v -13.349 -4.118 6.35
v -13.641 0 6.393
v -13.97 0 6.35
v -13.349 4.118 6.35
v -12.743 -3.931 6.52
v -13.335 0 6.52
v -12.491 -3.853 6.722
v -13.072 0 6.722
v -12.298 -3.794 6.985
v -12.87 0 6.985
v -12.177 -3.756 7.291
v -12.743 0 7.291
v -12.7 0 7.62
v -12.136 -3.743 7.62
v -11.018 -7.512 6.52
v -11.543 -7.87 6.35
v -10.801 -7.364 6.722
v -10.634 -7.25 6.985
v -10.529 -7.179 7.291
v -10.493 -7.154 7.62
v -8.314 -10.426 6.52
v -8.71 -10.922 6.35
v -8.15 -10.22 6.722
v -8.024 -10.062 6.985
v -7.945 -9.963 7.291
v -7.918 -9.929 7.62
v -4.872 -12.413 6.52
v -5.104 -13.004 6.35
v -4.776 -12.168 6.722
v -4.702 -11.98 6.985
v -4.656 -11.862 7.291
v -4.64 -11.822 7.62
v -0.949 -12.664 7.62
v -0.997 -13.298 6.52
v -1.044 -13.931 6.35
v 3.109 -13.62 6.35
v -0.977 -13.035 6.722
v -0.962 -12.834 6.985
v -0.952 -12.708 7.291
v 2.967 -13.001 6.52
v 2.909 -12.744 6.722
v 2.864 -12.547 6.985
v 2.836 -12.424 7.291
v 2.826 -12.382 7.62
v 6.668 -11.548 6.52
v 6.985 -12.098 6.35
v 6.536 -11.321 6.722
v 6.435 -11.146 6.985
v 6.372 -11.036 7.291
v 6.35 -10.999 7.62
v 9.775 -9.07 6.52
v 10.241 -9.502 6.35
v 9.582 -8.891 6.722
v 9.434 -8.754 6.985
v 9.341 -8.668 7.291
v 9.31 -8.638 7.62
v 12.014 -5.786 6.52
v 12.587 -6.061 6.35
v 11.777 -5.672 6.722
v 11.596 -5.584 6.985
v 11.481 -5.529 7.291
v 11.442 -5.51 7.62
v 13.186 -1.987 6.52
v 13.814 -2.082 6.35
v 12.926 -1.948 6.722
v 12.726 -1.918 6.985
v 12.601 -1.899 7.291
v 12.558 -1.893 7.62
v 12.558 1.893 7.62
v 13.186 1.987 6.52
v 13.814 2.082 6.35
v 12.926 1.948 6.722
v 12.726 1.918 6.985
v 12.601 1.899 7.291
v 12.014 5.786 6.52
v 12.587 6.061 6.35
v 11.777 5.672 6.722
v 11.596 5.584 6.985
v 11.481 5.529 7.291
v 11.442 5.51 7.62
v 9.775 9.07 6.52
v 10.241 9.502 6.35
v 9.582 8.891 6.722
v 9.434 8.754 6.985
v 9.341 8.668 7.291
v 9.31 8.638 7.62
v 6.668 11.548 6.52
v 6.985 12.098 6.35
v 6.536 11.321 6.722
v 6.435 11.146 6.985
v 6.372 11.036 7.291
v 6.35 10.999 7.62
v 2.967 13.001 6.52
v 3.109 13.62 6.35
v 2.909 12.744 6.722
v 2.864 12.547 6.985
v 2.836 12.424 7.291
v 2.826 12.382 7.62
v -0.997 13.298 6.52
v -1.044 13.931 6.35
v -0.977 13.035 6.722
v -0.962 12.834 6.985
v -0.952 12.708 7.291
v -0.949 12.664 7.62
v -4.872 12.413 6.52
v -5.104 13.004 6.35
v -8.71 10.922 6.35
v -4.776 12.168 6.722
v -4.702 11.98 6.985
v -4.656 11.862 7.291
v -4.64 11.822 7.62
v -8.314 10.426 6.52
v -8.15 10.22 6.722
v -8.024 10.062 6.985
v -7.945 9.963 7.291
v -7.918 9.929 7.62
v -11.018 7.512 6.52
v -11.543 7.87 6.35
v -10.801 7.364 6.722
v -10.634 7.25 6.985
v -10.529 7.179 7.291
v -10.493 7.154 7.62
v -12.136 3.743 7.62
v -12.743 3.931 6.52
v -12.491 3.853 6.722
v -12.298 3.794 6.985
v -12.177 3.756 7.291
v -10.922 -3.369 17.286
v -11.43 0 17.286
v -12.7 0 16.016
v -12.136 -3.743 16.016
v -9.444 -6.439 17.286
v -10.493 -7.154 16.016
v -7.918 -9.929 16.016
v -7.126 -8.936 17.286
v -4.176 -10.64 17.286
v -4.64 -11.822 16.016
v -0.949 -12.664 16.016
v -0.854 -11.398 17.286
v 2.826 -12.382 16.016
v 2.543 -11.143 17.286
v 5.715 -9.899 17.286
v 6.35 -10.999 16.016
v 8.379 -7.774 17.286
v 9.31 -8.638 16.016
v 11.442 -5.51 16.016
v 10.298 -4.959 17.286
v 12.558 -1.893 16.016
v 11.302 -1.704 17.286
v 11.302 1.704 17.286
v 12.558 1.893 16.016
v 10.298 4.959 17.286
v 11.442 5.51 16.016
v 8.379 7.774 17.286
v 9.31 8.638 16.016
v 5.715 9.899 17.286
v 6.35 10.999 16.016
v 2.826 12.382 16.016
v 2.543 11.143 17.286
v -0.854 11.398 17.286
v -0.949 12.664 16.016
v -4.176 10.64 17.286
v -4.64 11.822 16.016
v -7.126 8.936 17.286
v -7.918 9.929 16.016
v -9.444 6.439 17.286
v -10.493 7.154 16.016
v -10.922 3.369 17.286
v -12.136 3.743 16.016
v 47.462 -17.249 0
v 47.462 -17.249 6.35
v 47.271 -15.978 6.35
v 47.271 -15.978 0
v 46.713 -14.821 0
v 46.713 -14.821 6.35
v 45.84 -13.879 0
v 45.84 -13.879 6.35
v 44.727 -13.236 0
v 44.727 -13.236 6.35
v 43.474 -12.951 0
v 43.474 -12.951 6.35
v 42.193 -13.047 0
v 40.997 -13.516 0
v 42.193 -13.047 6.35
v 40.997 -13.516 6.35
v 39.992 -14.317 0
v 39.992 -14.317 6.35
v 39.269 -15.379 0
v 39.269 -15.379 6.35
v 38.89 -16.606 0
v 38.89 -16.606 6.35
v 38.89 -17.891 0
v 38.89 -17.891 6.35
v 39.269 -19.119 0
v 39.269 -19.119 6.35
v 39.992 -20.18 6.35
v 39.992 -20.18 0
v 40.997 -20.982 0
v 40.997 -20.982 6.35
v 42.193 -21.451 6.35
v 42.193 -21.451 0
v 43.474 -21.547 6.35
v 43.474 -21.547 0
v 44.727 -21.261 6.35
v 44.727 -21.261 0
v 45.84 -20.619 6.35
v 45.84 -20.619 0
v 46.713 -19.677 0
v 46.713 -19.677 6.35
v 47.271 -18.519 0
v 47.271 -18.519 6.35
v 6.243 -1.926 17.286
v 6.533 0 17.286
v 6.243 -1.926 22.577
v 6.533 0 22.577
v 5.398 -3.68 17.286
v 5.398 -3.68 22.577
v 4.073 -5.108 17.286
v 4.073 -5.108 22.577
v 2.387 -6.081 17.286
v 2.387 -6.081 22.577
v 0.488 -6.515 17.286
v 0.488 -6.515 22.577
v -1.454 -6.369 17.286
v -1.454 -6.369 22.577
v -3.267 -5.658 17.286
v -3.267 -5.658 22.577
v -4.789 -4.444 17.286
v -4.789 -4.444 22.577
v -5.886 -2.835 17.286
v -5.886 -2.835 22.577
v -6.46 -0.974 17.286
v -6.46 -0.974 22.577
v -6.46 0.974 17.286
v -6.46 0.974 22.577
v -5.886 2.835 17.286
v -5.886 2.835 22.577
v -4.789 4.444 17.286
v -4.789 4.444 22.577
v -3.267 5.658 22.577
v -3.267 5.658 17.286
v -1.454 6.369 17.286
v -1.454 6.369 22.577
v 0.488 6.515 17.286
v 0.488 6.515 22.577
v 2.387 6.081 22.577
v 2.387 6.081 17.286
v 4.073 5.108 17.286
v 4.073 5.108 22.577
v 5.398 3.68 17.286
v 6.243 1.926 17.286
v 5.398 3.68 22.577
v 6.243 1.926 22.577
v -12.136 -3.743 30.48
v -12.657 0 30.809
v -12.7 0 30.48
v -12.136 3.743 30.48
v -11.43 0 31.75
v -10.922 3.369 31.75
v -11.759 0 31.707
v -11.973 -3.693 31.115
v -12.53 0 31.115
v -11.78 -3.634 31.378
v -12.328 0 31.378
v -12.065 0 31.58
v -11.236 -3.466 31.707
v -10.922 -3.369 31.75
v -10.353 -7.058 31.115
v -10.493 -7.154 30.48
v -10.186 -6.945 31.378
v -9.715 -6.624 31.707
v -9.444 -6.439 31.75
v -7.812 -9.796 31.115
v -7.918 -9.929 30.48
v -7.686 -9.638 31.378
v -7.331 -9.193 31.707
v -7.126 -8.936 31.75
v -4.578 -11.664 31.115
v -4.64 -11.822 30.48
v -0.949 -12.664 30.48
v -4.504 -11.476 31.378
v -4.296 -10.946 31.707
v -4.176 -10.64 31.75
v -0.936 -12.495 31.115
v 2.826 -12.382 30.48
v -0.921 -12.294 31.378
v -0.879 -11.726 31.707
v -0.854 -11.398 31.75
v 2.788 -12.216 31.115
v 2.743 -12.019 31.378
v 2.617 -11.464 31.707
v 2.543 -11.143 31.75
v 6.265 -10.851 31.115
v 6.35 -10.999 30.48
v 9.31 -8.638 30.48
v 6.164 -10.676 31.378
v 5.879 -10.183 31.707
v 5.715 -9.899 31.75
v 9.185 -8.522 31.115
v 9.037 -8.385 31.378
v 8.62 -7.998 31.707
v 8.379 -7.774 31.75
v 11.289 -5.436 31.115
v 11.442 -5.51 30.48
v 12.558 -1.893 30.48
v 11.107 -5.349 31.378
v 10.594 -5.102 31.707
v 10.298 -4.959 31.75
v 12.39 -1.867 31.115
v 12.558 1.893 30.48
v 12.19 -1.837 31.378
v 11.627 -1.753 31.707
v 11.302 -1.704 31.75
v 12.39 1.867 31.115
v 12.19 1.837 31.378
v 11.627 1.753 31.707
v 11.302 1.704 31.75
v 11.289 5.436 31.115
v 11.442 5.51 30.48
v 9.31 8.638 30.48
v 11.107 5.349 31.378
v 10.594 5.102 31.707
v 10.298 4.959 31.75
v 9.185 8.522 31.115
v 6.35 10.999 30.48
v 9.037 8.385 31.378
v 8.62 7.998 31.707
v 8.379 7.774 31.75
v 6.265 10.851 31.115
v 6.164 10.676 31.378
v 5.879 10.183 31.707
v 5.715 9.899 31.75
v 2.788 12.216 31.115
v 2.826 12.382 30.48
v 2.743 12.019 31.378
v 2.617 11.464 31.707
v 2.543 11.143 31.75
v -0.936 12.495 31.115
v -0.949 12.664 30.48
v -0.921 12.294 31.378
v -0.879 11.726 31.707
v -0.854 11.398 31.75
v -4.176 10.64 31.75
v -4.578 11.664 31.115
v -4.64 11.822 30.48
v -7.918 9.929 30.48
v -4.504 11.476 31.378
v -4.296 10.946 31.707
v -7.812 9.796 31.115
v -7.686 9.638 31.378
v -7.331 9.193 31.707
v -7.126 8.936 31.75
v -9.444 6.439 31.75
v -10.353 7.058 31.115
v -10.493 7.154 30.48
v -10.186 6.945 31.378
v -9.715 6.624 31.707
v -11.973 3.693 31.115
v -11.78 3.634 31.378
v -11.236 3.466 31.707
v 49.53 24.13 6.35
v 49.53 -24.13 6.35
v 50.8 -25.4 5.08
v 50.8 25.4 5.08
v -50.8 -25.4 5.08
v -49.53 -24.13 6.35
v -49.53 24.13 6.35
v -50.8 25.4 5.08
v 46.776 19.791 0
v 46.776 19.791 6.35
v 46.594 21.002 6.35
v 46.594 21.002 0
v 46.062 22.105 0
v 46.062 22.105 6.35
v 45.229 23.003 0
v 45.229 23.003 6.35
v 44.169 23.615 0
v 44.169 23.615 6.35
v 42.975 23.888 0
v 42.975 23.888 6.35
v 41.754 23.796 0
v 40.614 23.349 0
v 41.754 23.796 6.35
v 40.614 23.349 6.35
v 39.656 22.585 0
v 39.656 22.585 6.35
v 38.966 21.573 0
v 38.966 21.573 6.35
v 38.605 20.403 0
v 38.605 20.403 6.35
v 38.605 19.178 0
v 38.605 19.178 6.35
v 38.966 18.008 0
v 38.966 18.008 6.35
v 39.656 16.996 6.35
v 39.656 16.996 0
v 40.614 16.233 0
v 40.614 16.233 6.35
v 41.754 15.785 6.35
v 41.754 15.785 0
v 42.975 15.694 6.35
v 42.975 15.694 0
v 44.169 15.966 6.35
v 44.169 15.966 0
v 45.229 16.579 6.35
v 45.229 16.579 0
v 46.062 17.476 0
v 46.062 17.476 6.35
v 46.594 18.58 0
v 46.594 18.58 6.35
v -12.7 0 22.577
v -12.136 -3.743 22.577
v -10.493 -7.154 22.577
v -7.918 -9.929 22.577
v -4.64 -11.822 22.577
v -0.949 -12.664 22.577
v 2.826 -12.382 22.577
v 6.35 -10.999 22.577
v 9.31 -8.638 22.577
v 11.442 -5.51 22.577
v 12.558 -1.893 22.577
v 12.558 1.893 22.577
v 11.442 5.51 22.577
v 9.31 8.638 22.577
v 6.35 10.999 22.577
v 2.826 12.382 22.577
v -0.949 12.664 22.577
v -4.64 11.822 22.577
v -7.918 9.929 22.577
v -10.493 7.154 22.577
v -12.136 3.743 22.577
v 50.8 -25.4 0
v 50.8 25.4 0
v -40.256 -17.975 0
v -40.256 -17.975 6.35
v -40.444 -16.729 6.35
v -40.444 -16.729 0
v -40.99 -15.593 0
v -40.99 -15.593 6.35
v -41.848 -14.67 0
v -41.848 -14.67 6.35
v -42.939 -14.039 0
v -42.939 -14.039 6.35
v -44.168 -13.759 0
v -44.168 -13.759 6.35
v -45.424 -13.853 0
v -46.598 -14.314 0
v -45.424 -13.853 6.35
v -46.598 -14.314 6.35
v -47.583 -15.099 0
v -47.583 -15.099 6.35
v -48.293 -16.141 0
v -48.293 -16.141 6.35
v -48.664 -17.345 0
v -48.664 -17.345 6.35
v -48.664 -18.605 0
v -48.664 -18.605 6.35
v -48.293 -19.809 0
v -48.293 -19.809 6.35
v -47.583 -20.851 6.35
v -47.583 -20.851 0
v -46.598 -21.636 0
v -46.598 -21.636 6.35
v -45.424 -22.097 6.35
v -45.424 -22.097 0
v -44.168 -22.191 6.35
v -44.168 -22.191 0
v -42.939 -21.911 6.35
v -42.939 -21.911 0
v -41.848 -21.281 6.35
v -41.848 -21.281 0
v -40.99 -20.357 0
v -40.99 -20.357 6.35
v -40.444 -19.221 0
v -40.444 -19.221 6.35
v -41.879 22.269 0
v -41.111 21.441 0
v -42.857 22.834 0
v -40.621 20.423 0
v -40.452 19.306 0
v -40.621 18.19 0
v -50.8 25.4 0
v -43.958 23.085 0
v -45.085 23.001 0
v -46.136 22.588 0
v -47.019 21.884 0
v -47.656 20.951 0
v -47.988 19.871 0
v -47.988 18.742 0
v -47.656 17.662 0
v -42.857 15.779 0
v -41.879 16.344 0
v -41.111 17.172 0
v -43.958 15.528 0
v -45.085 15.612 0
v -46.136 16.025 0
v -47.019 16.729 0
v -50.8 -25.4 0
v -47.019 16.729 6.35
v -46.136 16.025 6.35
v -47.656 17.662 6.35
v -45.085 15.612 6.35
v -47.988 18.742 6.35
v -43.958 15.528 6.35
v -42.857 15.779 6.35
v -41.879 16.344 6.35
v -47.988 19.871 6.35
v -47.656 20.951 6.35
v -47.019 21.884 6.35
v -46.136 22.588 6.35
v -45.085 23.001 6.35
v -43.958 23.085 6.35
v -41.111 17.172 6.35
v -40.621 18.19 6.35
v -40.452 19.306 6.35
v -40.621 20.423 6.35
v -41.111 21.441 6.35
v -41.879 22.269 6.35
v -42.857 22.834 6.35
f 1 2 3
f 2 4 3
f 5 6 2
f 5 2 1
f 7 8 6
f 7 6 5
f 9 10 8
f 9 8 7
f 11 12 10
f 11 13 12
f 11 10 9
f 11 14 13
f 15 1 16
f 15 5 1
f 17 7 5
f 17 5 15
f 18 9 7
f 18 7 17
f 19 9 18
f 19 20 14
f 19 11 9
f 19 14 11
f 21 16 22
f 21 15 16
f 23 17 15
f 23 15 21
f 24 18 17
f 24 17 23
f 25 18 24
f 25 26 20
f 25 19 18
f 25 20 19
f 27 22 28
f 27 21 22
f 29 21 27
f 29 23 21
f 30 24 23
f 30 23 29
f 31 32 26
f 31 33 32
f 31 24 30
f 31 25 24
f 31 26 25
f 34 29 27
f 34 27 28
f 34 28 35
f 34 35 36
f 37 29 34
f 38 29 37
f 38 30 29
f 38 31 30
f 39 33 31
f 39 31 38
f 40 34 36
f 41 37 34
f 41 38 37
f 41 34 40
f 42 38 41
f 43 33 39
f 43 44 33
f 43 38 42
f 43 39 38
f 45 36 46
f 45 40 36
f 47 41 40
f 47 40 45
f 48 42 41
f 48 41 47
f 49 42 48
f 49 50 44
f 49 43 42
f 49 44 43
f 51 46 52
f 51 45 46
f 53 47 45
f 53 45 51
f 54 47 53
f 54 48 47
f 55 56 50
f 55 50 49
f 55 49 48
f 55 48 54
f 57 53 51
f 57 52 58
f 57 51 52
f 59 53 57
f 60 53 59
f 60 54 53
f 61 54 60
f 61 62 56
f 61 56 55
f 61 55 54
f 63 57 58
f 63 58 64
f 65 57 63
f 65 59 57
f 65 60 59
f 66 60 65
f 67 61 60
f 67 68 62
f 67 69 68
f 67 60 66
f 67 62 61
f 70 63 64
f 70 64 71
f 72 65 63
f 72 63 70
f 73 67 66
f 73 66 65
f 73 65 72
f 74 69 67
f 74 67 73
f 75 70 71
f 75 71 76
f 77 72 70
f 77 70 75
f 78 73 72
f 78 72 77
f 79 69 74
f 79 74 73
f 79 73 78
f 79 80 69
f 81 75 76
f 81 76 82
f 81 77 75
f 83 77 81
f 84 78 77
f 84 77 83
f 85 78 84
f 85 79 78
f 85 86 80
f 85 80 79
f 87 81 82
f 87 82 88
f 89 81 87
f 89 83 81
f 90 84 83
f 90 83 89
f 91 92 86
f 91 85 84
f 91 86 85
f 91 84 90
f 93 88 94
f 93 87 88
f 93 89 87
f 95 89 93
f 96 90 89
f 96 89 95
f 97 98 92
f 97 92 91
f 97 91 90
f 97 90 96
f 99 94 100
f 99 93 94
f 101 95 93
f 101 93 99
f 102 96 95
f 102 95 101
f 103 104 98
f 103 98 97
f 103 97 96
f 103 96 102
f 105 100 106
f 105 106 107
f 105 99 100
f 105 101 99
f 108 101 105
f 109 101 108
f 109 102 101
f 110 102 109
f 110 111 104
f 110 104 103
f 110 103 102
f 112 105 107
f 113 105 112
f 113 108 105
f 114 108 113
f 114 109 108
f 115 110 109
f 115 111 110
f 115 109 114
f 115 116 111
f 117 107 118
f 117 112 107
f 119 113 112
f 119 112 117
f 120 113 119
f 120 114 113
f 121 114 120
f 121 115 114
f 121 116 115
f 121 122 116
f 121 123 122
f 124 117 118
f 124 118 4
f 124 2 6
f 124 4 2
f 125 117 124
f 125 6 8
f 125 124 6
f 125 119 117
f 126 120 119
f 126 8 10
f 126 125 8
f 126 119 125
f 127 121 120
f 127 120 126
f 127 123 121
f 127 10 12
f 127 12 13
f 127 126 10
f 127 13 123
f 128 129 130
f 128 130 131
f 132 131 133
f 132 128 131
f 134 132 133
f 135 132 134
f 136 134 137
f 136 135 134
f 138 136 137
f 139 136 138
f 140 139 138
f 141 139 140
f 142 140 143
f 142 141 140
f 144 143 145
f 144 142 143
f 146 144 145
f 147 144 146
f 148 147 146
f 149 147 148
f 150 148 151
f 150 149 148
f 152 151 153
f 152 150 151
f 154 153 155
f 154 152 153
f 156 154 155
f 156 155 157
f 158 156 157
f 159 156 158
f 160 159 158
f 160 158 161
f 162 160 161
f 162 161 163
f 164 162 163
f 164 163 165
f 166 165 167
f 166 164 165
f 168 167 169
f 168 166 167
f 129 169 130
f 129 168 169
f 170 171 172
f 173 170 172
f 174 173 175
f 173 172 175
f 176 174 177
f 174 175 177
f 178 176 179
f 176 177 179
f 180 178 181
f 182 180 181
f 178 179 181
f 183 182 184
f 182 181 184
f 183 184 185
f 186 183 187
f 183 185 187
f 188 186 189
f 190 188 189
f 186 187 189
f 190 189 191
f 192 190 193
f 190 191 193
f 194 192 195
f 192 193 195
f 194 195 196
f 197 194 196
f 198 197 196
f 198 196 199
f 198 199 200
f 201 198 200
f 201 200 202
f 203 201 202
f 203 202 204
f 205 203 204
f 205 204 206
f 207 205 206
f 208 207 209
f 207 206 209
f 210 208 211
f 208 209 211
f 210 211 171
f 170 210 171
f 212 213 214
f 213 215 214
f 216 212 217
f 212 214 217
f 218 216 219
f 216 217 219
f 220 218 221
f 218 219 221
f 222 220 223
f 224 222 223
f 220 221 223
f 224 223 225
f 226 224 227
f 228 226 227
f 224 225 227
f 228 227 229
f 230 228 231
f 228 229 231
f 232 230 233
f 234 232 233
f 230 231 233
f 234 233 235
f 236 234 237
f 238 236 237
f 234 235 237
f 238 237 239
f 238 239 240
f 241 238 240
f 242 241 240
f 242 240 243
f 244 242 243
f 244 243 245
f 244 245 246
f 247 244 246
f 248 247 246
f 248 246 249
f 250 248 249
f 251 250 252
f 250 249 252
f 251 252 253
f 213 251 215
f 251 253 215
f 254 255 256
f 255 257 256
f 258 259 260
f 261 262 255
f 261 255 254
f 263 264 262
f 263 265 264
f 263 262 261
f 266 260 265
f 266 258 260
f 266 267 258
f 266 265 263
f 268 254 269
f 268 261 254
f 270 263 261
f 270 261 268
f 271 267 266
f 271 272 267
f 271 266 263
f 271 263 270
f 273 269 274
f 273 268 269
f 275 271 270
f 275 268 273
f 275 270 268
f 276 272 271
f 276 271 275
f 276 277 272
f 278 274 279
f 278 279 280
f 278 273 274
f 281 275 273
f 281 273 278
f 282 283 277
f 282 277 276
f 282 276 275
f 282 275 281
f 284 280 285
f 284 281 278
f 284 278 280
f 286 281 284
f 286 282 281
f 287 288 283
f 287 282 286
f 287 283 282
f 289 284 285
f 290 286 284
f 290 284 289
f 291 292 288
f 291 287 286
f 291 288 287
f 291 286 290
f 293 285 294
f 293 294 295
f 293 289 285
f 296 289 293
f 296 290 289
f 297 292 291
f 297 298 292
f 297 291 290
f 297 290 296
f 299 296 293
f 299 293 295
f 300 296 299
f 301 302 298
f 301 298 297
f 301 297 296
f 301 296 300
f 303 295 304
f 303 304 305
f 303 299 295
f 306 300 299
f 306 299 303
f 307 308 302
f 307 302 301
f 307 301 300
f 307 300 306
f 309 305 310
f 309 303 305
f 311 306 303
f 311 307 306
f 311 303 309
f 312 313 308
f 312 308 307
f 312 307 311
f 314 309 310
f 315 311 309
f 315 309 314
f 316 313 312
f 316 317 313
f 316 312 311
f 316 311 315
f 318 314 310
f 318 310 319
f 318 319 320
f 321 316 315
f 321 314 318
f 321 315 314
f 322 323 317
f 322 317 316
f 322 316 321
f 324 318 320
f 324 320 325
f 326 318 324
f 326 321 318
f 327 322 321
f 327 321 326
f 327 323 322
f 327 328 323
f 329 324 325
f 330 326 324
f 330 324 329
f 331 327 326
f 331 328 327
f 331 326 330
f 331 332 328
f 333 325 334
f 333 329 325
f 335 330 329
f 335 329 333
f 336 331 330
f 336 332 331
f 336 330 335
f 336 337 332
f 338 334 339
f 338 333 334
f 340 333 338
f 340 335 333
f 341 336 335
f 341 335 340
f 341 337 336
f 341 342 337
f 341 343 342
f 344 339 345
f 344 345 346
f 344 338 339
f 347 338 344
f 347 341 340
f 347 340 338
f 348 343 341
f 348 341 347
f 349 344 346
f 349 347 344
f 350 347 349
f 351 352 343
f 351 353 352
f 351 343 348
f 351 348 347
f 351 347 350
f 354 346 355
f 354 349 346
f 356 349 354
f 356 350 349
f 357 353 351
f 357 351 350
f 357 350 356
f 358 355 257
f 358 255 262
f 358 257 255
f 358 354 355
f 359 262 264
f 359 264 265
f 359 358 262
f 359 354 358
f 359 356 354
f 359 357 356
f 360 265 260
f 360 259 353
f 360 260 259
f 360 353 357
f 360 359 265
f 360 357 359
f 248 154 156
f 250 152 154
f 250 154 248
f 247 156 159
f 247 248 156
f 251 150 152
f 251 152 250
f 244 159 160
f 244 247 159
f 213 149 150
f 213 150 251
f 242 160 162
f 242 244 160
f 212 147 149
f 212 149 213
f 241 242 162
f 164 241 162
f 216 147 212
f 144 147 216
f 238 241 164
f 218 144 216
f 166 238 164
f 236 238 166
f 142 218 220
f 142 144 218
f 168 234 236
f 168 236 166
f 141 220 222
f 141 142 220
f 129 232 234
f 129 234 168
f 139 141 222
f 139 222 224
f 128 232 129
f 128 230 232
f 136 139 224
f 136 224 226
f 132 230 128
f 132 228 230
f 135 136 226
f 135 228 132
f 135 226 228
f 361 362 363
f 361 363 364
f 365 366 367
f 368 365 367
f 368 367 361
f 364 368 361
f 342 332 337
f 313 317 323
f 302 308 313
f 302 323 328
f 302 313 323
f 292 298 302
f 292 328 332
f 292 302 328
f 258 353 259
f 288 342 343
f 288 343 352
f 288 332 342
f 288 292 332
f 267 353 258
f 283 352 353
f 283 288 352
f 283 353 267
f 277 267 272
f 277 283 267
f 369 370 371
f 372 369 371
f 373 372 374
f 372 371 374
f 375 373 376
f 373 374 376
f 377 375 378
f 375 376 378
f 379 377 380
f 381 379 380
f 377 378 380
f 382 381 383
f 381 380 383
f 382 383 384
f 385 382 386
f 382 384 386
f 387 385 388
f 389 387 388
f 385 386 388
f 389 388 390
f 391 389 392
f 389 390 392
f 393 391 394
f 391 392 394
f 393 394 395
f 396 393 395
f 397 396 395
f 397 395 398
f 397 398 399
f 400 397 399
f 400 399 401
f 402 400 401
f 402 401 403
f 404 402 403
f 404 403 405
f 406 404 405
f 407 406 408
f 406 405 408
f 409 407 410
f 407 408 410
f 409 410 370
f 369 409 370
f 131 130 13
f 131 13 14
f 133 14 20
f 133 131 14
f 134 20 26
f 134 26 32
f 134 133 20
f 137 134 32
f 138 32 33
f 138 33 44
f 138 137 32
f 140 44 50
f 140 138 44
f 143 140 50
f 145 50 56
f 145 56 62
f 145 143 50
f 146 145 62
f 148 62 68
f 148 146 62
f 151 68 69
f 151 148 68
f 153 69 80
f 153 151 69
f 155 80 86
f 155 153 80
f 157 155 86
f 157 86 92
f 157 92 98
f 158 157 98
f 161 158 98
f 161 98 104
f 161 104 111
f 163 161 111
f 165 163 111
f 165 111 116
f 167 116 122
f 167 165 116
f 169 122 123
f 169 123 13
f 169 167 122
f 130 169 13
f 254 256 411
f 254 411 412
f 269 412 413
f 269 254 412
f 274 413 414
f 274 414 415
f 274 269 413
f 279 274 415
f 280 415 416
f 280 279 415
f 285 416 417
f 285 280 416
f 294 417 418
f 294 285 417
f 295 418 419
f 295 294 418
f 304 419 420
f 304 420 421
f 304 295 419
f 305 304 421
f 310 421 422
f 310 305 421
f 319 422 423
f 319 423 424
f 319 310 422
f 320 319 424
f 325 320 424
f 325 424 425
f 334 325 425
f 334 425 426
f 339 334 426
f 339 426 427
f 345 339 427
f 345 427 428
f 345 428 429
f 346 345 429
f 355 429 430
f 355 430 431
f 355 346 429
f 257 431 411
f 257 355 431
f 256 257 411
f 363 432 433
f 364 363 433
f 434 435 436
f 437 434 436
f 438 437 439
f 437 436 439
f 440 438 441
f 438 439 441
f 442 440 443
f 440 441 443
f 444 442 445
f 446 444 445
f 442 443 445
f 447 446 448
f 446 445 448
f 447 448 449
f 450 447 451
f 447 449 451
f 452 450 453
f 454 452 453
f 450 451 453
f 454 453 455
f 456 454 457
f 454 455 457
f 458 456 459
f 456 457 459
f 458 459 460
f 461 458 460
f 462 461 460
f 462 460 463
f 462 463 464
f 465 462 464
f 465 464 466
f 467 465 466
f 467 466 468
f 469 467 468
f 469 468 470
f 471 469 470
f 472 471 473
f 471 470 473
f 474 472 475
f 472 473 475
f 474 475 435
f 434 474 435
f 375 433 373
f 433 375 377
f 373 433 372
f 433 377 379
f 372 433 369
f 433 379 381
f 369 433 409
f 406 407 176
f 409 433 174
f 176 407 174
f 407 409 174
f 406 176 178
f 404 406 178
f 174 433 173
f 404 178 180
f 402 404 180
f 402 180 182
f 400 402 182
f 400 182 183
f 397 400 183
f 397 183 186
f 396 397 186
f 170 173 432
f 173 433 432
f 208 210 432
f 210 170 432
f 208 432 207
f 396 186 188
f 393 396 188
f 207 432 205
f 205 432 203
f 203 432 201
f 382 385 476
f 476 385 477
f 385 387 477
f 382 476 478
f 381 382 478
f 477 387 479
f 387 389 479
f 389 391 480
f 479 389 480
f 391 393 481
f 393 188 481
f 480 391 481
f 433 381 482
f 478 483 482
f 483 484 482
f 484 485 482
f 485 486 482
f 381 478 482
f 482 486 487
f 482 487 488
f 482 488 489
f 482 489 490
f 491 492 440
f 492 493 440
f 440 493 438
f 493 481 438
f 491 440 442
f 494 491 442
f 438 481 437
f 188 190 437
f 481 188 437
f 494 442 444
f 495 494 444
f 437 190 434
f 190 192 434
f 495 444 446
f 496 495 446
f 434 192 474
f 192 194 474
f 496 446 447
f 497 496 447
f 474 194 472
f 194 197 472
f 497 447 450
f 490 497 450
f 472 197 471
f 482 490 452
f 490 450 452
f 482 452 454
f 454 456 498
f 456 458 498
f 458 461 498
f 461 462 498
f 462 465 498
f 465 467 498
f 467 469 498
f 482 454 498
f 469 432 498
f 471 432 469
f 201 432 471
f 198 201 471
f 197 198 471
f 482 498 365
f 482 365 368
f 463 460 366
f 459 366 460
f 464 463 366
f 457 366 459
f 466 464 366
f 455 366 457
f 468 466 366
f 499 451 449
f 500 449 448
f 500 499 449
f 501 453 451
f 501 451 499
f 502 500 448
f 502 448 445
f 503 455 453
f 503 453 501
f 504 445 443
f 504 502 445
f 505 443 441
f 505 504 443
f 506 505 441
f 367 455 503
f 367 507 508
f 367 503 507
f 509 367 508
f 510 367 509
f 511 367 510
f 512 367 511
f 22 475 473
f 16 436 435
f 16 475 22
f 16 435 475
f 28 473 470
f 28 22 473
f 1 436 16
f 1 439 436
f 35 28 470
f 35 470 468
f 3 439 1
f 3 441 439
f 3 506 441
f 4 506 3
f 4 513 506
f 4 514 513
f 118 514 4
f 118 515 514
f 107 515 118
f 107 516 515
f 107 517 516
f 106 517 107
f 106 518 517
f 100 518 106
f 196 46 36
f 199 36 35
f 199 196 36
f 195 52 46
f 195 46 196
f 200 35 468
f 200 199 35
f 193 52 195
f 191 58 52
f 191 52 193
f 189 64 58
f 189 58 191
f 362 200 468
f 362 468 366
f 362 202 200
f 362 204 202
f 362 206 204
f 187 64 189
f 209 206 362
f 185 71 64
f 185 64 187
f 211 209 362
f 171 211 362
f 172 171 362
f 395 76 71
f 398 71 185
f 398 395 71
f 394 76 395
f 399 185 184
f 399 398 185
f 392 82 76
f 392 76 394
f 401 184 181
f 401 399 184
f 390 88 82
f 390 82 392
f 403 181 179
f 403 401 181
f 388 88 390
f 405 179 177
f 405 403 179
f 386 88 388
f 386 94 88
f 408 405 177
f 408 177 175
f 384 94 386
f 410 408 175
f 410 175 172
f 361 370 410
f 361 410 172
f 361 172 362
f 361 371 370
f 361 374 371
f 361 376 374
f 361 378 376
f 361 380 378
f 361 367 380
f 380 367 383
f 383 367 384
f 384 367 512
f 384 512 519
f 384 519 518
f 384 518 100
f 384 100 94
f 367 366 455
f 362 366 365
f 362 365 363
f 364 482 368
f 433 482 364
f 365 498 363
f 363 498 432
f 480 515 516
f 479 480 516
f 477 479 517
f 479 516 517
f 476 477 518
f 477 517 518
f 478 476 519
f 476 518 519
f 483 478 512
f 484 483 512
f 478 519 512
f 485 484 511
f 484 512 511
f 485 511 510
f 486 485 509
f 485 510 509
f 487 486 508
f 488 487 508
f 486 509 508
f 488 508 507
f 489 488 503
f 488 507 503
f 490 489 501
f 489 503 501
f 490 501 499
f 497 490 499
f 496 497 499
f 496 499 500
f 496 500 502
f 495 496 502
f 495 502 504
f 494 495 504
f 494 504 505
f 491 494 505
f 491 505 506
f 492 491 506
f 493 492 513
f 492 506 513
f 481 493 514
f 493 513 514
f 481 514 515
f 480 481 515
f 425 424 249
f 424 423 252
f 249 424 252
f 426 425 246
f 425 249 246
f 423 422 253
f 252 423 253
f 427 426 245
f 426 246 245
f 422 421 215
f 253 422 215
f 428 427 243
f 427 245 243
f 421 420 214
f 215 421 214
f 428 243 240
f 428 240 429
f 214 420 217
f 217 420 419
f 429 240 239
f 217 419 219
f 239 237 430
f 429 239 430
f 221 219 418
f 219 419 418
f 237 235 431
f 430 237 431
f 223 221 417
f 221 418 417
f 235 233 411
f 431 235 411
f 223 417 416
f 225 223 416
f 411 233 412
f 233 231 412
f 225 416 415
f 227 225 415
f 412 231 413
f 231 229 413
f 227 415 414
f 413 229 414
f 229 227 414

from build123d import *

# Parameters (mm, degrees)
F0_W     = 101.6
F0_H     = 50.8
F1_DEPTH = 6.35
F2_R     = 3.789272
F2_R_2   = 4.108367
F2_R_3   = 4.310253
F2_R_4   = 4.227881
F3_DEPTH = 6.35
F4_W     = 12.7
F4_H     = 31.75
F6_W     = 6.35
F6_H     = 5.291667
F8_SIZE  = 1.27
F9_R     = 1.27
F10_SIZE = 1.27


with BuildPart() as f1:
    # F0 (on Top) → F1 (new body)
    with BuildSketch(Plane.XY):
        Rectangle(F0_W, F0_H)
    extrude(amount=F1_DEPTH)

    # F2 (on face) → F3 (cut)
    with BuildSketch(Plane.XY.offset(6.35)):
        with Locations((-44.241536, 19.306498)):
            Circle(F2_R)
        with Locations((42.667963, 19.790674)):
            Circle(F2_R_2)
        with Locations((43.152139, -17.248752)):
            Circle(F2_R_3)
        with Locations((-44.483624, -17.975016)):
            Circle(F2_R_4)
    extrude(amount=-F3_DEPTH, mode=Mode.SUBTRACT)

    # F4 (on Front) → F5 (revolve)
    with BuildSketch(Plane.XZ):
        with Locations((-6.35, 15.875)):
            Rectangle(F4_W, F4_H)
    revolve(axis=Axis((0, 0, 15.875), (0, 0, 1)))

    # F6 (on Front) → F7 (revolve, cut)
    with BuildSketch(Plane.XZ):
        with Locations((9.708053, 19.931483)):
            Rectangle(F6_W, F6_H)
    revolve(axis=Axis((0, 0, 31.75), (0, 0, -1)), mode=Mode.SUBTRACT)

    # F8
    f8_edges = [f1.edges().sort_by_distance(p)[0] for p in [
        (0, -25.4, 6.35),
        (-50.8, 0, 6.35),
        (0, 25.4, 6.35),
        (50.8, 0, 6.35),
    ]]
    chamfer(f8_edges, length=F8_SIZE)

    # F9
    f9_edges = [f1.edges().sort_by_distance(p)[0] for p in [
        (12.7, 0, 6.35),
        (12.7, 0, 31.75),
    ]]
    fillet(f9_edges, radius=F9_R)

    # F10
    f10_edges = [f1.edges().sort_by_distance(p)[0] for p in [
        (12.7, 0, 17.285649),
    ]]
    chamfer(f10_edges, length=F10_SIZE)


solid = f1.part
